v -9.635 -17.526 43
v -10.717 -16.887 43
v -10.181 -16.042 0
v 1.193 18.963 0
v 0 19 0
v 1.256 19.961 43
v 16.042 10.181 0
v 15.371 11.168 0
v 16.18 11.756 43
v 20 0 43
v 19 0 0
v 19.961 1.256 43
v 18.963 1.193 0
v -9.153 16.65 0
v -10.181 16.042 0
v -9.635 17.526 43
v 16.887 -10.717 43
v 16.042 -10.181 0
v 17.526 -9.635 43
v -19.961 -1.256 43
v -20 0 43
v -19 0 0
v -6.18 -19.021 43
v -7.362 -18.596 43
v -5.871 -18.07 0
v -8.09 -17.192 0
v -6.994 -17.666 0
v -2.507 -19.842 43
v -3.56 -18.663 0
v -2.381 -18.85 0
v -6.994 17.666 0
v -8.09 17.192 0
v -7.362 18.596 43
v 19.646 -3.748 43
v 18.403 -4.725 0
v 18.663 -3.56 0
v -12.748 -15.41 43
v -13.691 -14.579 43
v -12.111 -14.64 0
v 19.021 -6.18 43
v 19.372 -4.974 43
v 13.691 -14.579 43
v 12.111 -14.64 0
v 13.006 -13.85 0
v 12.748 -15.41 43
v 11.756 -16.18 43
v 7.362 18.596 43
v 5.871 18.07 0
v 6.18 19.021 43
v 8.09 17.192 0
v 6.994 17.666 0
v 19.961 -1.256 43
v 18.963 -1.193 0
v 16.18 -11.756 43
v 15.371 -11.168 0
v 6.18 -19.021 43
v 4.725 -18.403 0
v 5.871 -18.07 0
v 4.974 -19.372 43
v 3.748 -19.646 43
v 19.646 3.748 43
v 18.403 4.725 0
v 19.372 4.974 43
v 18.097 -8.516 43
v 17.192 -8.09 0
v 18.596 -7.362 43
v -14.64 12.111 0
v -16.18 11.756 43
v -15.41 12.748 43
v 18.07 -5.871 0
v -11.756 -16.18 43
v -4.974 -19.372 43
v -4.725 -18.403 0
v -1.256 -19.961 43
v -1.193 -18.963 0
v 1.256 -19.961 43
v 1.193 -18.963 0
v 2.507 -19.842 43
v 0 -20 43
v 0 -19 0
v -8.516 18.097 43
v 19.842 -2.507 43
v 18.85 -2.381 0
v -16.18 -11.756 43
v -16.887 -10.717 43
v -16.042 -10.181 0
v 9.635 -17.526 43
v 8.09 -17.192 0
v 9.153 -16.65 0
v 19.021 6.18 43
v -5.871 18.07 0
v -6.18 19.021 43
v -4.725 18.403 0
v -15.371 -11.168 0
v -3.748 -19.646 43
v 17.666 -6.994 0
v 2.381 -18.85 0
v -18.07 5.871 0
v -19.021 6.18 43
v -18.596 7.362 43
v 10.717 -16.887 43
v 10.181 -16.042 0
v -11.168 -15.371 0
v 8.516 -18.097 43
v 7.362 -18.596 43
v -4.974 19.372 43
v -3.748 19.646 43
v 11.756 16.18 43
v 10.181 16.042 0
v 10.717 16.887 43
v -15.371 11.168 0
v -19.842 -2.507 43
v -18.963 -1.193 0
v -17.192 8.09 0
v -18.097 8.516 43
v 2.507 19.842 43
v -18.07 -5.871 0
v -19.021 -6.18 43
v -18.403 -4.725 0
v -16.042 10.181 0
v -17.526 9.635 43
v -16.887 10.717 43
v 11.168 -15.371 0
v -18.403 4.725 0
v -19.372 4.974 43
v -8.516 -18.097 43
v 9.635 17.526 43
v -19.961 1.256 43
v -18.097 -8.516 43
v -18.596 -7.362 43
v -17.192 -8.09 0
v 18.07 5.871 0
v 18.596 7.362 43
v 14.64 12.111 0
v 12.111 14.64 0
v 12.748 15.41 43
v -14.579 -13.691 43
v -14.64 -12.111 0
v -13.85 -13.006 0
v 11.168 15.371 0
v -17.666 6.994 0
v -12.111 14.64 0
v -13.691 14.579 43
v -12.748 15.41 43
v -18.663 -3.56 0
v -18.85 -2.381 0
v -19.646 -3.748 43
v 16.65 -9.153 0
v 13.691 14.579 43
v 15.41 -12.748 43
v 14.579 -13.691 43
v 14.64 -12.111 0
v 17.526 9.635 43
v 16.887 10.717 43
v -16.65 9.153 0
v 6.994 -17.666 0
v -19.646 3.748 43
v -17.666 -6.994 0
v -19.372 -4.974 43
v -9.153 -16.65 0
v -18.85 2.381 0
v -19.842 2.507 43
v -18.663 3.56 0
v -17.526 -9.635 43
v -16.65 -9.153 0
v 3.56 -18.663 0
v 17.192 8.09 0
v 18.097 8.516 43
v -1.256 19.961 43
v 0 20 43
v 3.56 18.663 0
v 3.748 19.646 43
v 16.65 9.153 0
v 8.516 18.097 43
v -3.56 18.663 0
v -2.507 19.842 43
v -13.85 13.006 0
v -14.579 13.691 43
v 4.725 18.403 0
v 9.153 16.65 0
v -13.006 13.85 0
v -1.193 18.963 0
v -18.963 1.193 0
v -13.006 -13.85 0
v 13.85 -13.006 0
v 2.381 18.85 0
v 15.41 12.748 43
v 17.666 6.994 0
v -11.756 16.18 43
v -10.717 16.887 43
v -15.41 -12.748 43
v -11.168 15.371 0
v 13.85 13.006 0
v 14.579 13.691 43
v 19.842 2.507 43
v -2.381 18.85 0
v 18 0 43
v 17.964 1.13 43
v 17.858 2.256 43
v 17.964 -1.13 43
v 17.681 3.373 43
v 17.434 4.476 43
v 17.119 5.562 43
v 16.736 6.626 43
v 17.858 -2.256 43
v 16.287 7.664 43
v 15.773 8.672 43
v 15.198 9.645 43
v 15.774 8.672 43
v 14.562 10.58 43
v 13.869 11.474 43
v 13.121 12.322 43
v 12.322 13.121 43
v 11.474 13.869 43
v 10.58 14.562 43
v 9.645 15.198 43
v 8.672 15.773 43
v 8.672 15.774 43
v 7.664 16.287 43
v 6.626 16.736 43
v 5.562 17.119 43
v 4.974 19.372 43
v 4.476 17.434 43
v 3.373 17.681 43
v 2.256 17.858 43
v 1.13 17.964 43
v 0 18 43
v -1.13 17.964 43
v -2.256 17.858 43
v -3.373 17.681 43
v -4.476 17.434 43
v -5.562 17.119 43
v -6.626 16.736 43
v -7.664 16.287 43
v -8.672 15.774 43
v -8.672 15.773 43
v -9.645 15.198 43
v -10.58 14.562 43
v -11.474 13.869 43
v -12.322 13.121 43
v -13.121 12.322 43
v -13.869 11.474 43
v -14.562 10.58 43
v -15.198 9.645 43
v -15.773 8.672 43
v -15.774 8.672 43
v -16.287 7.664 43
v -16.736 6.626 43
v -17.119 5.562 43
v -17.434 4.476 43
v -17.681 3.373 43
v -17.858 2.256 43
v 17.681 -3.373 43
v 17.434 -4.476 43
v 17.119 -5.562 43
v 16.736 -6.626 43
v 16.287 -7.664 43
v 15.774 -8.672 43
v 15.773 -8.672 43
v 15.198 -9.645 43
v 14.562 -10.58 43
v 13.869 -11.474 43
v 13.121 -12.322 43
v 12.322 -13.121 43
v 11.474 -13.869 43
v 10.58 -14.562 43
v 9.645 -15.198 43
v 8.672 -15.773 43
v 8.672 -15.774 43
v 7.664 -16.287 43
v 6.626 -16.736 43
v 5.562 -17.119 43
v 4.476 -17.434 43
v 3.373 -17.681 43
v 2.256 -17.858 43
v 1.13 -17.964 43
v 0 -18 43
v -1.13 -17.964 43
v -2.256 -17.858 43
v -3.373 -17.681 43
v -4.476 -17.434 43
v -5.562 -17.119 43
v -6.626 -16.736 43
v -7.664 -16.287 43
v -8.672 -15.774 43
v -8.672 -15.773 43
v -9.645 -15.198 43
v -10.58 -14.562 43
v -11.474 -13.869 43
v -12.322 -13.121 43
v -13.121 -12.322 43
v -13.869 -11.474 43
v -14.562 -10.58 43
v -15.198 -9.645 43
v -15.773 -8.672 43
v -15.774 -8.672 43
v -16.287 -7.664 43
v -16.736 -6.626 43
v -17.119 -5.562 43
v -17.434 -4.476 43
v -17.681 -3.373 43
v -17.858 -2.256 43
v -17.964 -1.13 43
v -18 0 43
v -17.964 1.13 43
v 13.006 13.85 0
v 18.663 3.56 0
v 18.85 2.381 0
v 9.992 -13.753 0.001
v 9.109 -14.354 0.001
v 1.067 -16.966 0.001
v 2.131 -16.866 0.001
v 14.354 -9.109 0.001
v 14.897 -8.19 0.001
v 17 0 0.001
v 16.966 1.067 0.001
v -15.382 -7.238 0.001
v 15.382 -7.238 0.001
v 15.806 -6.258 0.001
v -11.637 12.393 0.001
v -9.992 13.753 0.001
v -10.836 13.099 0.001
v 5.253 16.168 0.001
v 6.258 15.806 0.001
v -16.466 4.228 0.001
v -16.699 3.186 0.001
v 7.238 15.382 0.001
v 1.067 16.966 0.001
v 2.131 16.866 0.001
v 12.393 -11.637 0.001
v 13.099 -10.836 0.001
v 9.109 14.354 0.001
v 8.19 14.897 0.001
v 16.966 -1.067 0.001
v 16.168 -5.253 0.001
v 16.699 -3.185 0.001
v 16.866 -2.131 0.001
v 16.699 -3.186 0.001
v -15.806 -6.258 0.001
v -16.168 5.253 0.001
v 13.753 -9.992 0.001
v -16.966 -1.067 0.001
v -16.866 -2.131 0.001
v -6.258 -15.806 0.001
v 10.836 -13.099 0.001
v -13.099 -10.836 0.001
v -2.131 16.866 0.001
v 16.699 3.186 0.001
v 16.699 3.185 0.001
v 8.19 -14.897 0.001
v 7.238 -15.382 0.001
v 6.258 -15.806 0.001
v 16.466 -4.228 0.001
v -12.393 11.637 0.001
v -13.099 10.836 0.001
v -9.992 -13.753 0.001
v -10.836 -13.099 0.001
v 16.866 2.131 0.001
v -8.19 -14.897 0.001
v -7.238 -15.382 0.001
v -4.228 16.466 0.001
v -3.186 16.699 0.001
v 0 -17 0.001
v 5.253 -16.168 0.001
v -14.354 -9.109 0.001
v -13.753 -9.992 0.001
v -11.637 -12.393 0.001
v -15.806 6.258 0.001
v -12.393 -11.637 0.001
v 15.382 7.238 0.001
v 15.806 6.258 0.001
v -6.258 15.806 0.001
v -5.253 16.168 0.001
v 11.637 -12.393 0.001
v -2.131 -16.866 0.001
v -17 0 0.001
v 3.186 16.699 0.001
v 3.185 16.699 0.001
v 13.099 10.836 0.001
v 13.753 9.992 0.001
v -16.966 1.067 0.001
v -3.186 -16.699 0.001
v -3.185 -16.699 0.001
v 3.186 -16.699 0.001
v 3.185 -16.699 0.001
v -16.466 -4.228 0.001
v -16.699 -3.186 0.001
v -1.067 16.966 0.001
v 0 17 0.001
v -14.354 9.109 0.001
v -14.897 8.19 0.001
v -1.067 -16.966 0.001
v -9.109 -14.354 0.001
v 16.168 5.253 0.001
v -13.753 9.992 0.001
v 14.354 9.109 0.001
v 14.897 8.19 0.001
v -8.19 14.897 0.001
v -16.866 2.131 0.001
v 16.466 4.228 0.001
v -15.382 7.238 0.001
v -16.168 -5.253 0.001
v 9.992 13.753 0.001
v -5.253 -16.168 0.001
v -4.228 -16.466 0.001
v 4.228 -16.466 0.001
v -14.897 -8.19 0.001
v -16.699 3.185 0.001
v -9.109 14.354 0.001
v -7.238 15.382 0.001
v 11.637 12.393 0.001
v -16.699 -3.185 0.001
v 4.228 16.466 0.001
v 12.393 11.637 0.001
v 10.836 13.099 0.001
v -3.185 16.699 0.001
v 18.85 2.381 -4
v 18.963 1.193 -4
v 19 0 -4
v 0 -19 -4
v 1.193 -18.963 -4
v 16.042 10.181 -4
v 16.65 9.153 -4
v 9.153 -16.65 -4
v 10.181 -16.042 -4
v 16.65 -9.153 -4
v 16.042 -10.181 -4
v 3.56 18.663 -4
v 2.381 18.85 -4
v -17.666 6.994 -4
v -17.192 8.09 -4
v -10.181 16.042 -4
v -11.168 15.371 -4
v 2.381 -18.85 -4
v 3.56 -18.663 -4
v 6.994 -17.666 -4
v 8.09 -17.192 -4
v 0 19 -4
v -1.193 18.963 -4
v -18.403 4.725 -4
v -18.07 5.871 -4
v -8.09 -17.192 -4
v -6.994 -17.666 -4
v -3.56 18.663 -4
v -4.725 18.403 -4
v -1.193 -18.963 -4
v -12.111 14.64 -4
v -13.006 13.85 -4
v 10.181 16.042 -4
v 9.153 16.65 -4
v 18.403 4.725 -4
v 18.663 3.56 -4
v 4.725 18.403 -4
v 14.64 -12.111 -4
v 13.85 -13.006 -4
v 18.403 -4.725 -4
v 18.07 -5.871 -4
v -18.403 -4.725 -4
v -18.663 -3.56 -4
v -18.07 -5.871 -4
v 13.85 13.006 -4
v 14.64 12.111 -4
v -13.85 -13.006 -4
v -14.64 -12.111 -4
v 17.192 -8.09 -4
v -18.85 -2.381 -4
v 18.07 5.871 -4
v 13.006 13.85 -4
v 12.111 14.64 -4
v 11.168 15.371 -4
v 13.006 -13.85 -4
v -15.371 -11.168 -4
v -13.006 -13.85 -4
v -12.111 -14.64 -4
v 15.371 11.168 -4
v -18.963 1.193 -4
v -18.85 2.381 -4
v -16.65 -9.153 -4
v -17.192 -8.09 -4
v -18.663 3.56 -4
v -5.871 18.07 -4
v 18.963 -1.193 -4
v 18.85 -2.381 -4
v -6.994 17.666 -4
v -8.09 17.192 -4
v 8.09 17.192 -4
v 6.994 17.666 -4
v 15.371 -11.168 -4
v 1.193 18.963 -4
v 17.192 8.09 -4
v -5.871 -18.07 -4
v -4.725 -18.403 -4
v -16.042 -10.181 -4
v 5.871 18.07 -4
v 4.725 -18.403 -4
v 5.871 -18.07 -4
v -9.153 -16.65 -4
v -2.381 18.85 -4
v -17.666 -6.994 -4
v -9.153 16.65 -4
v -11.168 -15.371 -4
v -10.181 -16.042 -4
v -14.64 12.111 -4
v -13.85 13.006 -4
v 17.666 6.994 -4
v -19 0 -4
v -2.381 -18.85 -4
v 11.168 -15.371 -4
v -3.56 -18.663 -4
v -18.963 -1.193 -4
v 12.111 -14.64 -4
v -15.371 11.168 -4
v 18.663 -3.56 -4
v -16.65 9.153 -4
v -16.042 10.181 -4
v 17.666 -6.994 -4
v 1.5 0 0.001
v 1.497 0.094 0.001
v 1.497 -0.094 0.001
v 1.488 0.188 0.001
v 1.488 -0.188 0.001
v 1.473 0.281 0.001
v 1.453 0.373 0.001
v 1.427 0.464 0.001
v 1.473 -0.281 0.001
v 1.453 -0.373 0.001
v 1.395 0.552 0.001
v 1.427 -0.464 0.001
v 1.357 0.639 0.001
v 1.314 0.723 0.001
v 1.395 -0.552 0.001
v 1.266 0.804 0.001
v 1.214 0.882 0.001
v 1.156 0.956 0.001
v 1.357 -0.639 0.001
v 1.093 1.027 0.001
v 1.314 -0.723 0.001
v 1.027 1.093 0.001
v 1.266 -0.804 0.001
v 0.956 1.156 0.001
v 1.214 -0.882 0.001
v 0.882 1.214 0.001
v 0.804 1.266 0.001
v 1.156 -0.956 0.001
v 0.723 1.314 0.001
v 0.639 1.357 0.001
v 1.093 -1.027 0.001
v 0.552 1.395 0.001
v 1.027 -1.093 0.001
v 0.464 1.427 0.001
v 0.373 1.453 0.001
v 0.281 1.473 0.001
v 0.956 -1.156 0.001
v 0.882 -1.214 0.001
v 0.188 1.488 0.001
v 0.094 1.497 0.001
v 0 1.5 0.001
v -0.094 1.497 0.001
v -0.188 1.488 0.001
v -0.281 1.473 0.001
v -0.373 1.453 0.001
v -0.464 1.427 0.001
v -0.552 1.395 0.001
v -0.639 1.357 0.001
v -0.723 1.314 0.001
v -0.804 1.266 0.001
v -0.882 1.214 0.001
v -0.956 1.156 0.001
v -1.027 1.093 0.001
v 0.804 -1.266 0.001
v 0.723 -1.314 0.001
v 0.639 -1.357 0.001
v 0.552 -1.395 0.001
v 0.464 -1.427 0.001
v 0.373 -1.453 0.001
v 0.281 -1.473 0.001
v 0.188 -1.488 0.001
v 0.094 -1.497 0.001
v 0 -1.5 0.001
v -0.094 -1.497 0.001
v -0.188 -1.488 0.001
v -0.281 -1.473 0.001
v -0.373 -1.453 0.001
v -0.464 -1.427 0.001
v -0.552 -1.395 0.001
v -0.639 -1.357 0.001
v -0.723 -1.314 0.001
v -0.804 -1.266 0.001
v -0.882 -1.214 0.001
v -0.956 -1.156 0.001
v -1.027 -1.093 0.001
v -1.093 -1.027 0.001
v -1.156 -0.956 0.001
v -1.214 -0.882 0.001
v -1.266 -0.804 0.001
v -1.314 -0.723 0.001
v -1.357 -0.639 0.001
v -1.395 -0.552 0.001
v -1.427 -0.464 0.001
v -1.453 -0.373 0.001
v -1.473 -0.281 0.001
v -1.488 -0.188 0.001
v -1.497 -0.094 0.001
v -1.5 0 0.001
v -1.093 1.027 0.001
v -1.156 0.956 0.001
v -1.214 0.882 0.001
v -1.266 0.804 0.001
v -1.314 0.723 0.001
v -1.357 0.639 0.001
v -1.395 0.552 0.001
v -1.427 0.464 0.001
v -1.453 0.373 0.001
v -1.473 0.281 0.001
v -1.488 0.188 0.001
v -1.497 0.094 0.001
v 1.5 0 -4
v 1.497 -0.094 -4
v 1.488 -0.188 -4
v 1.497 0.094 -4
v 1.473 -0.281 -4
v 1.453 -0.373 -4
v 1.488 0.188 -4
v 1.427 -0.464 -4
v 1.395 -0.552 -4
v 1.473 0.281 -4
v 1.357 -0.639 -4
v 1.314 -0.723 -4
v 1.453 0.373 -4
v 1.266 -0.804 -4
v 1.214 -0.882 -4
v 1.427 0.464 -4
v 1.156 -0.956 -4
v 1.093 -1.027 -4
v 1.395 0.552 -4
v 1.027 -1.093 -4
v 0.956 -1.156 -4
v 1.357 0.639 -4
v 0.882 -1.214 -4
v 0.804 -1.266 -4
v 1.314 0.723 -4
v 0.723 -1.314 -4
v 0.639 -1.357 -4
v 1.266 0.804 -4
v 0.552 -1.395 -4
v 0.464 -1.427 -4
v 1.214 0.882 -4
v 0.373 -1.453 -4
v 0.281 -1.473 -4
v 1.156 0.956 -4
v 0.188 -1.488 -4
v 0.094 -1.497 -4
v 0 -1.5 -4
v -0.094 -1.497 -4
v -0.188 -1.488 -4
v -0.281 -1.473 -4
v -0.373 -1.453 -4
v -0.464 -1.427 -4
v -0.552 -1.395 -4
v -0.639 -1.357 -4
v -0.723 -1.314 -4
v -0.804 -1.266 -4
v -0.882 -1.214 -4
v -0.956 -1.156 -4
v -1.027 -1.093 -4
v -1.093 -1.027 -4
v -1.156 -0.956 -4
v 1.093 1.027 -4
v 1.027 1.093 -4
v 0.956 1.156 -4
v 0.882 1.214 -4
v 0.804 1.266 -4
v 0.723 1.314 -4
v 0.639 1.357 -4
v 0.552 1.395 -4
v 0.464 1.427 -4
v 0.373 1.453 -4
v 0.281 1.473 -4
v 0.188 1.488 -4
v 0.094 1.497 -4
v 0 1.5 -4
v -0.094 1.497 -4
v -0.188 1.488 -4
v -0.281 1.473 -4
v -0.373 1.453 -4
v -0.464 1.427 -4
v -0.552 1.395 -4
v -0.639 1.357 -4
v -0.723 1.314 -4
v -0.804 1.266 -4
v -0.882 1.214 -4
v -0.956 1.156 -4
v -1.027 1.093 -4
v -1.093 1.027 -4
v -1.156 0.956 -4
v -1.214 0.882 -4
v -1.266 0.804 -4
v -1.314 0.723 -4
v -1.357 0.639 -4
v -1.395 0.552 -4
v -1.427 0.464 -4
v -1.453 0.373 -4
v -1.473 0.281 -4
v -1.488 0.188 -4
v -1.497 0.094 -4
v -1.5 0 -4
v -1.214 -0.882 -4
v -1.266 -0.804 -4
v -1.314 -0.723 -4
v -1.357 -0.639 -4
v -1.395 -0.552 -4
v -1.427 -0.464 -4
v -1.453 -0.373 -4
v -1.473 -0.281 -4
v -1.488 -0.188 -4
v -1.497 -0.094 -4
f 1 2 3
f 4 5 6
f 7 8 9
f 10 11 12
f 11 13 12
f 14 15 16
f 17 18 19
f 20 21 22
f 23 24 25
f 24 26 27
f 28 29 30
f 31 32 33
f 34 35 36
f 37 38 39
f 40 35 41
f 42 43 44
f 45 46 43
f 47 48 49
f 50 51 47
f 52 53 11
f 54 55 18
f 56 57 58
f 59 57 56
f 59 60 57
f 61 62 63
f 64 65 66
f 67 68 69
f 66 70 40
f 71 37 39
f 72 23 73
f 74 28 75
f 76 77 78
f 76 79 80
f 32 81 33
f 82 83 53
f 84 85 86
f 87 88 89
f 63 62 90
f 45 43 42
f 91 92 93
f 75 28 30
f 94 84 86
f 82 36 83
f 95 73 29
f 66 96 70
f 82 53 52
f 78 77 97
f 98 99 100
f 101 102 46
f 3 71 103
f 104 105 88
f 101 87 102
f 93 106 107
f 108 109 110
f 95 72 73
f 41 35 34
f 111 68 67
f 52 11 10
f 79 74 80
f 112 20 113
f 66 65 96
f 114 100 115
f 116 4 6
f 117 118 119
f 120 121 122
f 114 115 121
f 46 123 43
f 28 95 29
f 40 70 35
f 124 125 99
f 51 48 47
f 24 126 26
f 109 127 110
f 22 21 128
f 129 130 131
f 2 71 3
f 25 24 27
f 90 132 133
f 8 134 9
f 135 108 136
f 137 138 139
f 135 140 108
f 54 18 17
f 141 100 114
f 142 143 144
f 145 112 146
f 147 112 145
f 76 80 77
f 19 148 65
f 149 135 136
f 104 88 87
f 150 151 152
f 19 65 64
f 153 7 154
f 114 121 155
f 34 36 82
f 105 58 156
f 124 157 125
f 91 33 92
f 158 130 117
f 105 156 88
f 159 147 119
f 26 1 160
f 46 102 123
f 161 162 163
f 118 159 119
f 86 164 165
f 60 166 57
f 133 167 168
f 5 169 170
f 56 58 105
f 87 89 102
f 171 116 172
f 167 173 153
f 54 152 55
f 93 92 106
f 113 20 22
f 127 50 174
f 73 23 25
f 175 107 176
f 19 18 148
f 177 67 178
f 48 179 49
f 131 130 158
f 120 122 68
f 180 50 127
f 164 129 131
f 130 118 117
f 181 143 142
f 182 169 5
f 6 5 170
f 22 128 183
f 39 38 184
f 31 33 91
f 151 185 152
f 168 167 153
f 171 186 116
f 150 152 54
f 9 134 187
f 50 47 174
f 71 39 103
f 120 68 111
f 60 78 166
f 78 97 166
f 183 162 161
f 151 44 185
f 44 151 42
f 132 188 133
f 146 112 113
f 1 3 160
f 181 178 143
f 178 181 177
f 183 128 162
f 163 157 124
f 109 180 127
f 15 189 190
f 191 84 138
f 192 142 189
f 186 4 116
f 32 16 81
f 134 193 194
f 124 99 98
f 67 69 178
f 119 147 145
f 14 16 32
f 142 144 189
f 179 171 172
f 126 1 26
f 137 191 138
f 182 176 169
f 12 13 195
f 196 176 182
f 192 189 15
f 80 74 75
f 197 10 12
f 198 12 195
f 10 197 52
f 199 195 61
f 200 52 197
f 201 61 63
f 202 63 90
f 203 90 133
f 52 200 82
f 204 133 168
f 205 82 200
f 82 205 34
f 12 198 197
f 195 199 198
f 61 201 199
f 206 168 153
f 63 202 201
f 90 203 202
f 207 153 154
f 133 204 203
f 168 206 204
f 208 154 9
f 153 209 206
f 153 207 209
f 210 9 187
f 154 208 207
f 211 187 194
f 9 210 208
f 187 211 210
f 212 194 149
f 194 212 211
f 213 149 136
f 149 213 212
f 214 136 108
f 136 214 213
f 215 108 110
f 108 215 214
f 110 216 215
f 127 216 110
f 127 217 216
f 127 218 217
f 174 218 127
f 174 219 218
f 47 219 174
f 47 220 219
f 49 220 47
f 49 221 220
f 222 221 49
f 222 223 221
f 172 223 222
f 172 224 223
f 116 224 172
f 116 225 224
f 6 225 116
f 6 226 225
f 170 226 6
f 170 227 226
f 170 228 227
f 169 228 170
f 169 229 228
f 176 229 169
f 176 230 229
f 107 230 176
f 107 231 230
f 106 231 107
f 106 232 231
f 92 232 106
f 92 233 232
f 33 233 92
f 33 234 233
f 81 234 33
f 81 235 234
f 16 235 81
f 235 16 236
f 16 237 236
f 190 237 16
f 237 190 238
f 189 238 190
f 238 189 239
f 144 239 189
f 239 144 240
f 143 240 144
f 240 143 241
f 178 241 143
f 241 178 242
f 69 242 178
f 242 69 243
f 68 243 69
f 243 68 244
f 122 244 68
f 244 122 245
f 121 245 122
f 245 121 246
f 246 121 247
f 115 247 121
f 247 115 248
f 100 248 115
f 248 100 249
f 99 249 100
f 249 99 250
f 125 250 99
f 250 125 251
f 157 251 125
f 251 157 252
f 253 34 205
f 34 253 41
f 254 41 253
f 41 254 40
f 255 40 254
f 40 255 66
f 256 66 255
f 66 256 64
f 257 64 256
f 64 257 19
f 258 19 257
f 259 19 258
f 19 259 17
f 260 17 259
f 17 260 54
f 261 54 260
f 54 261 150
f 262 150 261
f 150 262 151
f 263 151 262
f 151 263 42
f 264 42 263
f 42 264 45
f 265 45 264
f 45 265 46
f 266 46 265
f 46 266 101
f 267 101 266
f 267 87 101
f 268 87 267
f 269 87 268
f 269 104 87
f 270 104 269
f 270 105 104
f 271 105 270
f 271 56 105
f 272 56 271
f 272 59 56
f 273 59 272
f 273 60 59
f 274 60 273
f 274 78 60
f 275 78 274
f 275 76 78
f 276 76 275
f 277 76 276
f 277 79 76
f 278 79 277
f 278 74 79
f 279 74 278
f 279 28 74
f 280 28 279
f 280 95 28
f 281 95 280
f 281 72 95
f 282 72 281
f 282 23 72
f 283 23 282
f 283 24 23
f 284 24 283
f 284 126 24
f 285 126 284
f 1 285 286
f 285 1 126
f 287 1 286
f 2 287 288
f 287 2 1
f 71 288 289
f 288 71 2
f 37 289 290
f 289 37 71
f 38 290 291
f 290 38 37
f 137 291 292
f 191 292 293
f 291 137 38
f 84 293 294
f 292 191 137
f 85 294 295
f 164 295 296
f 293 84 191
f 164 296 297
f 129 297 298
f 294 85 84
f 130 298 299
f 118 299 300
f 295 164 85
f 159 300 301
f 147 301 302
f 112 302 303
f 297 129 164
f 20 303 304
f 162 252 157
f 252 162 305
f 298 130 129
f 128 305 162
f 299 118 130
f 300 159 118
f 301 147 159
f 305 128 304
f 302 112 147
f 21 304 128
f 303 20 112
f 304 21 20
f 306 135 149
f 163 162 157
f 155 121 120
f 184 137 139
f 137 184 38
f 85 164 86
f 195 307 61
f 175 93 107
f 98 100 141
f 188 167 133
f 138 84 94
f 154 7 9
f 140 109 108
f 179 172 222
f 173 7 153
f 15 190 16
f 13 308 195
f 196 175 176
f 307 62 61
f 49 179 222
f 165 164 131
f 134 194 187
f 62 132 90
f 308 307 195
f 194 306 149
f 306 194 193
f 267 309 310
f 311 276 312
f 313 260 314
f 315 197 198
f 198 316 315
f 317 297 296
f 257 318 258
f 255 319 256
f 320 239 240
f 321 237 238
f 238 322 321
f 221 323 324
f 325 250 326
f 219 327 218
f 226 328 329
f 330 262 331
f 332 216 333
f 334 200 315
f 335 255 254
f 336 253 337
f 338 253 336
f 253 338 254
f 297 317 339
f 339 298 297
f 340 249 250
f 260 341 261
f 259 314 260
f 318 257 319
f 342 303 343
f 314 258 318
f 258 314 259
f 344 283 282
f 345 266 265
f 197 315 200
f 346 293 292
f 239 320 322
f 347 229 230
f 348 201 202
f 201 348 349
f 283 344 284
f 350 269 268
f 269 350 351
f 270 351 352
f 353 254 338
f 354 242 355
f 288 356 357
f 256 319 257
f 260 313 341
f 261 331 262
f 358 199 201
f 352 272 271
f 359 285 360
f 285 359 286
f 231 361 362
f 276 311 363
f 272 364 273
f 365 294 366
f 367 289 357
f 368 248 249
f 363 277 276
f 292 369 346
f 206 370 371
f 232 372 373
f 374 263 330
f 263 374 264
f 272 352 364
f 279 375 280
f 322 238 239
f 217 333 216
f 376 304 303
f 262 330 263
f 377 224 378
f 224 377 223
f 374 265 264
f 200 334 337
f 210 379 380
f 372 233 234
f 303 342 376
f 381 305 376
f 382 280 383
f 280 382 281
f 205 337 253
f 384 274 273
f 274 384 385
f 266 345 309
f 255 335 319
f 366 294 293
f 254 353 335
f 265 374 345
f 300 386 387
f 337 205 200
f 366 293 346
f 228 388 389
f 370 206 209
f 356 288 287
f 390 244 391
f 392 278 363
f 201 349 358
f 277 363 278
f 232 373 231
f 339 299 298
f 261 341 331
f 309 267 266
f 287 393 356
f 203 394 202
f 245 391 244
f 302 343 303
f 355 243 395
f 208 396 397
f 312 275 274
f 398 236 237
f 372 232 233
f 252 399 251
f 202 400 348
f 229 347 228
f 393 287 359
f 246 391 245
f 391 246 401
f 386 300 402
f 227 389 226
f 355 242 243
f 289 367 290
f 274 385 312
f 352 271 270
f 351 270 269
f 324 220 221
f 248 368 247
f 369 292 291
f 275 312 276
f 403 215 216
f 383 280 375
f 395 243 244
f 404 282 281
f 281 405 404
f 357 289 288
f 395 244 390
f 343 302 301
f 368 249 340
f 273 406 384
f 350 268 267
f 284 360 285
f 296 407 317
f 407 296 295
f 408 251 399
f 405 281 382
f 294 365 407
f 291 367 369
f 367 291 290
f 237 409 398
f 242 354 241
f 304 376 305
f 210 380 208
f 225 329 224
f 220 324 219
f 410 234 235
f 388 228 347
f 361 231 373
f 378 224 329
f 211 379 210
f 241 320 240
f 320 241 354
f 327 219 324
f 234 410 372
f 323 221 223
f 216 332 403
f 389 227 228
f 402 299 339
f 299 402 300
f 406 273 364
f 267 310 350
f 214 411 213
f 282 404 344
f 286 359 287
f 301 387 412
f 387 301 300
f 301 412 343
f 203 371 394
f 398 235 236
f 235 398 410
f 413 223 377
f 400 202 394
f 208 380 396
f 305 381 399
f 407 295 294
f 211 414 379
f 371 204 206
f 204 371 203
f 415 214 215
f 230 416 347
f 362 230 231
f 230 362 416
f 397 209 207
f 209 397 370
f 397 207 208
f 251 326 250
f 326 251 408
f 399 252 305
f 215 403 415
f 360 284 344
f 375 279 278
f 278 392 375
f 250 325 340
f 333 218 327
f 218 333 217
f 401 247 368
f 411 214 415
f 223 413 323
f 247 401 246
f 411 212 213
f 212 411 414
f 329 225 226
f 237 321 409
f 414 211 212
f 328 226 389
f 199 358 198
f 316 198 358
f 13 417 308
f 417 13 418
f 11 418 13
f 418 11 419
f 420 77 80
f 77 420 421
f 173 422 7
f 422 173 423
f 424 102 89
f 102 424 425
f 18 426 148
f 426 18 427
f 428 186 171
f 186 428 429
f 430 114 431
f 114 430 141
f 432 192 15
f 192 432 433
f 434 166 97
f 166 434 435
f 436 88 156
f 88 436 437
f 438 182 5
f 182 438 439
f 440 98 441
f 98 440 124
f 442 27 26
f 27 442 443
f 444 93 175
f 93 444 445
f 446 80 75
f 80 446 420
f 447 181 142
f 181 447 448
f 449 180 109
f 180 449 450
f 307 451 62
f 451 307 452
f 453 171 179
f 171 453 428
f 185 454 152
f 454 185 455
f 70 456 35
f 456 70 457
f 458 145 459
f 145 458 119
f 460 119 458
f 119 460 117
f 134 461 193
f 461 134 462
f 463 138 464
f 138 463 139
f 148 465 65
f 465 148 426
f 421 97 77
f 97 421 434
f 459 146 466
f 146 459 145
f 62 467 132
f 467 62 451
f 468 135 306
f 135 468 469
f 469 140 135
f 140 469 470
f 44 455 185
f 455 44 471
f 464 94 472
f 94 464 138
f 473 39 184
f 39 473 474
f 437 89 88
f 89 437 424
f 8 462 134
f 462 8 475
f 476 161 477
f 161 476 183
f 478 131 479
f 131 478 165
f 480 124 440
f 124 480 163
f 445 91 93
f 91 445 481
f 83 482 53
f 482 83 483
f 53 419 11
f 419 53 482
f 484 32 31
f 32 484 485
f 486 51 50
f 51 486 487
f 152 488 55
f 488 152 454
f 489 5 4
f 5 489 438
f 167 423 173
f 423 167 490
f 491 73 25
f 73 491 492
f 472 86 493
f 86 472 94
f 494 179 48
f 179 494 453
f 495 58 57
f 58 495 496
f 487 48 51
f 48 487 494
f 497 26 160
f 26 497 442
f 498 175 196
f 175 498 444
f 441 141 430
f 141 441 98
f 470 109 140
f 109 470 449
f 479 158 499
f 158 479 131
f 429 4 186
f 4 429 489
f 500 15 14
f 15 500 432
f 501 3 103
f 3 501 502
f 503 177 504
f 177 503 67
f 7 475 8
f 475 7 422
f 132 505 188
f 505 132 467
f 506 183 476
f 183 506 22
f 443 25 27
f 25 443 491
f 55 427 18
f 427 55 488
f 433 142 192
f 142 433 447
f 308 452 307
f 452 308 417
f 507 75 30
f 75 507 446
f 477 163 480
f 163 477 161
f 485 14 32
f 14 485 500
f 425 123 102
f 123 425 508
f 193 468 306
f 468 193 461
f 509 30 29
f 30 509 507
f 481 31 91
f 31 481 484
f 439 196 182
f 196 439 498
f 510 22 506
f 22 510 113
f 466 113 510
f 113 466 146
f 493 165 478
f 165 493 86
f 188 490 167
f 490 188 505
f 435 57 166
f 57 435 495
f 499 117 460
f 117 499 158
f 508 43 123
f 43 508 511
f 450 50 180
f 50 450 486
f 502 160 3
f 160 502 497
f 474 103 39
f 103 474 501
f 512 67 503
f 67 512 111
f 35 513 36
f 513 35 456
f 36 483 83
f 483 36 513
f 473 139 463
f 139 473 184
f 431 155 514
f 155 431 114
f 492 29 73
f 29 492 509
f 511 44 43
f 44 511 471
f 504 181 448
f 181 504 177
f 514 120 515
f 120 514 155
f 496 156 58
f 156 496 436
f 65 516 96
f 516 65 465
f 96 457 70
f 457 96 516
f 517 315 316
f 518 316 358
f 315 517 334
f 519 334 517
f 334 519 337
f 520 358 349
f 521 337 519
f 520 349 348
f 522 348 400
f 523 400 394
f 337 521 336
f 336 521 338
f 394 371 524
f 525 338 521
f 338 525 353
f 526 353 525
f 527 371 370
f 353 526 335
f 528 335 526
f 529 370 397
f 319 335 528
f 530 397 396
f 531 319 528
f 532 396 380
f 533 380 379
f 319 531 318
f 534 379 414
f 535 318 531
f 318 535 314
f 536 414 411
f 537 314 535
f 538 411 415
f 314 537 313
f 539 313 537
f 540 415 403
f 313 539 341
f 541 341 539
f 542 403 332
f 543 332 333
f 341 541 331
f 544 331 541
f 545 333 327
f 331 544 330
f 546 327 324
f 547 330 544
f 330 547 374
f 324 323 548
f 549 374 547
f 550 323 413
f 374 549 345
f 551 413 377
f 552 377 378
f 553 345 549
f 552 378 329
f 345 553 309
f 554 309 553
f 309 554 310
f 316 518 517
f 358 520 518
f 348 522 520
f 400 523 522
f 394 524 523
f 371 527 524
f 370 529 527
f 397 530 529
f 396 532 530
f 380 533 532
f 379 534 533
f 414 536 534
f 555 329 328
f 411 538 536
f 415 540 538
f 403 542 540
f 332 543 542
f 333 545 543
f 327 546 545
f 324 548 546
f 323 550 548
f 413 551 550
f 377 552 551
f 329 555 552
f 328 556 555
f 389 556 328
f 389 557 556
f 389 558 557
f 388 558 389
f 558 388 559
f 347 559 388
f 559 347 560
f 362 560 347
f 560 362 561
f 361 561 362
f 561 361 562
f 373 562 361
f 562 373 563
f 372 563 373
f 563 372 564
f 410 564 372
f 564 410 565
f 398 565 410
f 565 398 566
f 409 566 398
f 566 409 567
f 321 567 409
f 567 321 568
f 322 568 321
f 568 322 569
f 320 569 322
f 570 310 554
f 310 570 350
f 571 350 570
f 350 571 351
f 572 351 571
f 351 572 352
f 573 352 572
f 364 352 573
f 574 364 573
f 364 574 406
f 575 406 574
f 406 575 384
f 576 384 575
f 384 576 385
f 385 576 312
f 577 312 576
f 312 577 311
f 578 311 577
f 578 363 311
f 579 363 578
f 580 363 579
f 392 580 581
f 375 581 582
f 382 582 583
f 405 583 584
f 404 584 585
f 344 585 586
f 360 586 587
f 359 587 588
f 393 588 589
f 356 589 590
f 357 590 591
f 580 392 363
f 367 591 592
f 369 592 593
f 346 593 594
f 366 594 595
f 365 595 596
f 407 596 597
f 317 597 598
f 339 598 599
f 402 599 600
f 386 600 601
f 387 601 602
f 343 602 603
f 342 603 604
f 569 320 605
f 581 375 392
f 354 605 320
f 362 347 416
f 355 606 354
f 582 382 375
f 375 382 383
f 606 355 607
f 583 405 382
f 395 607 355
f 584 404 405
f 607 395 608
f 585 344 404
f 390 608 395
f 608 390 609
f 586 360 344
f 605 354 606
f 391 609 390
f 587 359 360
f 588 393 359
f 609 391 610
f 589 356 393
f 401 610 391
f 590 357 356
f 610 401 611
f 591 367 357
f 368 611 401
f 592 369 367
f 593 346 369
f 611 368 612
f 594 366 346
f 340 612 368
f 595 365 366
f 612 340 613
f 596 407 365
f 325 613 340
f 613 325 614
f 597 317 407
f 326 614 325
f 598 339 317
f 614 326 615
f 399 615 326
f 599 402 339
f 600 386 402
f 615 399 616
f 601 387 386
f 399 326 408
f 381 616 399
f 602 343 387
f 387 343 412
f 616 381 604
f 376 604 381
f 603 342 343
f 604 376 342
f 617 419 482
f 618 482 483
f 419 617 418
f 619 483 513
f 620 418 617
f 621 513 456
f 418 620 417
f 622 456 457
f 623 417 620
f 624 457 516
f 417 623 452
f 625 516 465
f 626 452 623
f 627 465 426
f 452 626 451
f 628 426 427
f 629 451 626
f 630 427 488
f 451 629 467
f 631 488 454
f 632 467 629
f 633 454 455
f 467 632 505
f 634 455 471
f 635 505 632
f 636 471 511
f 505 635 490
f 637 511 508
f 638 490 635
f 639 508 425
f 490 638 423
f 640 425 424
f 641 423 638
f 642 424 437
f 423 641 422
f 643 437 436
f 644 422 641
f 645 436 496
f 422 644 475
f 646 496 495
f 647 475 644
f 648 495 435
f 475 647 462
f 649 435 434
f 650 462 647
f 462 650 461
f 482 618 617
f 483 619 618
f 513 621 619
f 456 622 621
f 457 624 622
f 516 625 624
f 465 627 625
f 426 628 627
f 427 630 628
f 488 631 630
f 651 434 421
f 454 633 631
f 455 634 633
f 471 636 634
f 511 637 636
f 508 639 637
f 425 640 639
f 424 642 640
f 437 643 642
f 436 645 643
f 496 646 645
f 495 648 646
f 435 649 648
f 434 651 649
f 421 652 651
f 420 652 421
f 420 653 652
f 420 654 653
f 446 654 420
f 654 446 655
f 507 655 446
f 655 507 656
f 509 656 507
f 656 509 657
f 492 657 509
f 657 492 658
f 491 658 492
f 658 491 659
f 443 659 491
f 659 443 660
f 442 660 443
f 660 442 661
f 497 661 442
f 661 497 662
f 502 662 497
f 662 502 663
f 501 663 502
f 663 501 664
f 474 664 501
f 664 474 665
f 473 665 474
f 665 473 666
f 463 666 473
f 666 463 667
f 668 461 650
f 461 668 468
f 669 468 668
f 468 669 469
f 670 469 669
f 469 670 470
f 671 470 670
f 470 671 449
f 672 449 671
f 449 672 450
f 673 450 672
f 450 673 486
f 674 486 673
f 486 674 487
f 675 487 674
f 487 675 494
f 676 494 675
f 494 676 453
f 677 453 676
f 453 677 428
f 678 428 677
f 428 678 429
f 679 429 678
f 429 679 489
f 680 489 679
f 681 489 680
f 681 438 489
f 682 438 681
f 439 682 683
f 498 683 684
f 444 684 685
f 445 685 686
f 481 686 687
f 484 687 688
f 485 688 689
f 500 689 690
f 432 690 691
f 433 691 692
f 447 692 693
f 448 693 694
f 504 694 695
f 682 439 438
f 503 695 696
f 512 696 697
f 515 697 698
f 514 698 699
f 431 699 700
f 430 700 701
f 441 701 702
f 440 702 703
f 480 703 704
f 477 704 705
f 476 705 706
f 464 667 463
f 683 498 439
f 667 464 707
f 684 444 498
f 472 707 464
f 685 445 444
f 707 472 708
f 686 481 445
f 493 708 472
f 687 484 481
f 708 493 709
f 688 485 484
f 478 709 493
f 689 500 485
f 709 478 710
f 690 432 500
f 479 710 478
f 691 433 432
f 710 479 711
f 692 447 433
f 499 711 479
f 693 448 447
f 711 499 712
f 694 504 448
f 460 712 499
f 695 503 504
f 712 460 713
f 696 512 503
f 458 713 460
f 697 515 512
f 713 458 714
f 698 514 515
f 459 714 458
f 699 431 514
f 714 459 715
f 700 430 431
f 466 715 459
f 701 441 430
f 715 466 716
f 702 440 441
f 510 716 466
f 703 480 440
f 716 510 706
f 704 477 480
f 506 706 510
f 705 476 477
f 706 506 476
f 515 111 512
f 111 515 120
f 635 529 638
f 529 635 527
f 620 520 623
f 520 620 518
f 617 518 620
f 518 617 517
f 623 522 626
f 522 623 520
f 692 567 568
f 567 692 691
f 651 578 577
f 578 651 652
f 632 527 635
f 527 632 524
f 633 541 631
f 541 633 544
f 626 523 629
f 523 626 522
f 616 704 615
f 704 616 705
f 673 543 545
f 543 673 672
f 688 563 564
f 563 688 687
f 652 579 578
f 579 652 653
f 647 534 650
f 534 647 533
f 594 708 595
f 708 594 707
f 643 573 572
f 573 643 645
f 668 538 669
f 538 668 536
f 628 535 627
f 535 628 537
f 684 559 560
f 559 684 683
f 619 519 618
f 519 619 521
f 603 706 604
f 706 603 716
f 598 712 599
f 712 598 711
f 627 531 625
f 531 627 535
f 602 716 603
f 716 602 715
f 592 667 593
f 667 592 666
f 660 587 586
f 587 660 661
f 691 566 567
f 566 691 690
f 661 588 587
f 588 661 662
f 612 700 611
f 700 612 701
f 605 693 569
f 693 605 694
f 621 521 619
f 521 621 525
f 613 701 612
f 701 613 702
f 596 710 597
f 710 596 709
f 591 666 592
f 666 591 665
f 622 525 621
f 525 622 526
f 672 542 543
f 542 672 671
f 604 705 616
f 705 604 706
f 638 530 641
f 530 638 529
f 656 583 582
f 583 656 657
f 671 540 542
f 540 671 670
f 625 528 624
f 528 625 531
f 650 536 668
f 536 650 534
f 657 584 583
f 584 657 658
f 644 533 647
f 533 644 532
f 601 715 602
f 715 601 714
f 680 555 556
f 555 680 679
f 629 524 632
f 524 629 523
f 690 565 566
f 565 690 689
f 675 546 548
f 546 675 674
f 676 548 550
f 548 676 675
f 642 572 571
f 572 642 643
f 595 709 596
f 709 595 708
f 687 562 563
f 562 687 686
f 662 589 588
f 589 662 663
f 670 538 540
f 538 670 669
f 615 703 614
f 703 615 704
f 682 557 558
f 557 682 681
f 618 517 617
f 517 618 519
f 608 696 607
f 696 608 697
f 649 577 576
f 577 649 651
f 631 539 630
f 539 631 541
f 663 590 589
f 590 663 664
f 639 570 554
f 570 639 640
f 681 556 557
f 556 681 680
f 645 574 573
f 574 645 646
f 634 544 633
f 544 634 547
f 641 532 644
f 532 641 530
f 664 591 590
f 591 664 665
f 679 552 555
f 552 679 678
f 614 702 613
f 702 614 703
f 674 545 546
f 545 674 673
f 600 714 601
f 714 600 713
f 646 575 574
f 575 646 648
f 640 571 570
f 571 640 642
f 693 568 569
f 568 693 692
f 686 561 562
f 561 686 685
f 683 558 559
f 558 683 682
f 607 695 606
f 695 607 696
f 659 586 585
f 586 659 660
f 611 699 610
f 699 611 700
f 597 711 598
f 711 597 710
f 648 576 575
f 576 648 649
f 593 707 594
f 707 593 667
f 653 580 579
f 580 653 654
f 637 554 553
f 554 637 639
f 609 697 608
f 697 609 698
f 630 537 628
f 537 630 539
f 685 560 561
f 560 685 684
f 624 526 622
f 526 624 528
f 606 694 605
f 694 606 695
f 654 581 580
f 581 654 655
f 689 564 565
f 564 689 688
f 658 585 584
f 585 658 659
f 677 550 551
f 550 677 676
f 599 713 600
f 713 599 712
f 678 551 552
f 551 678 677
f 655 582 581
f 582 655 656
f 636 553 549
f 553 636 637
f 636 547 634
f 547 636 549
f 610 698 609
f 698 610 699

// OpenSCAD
// file: defs.scad
N_conexao = 36;
theta_h = 360 / N_conexao;
theta_v = 130;
d_conexao = 38;
d_inner_conexao = 20;
h_cunha = ( tan( theta_h / 2 ) * d_conexao ) / ( 2 * tan( theta_v / 2 ) );
bottom_conexao = 1;
eixo_conexao = 6;
tol_conexao = 0.25;

d_top_pescoco = 33;
d_bottom_pescoco = 35;
d_hole = 3;

wall_pescoco = 4;
bottom_wall_pescoco = 4;

height_pescoco = 43;

tol_pescoco = 1;

angulo_pescm = 0;
thick_pescm = 8;
h_pescm = 30;
thick_base_pescm = 4;
del_pescm = 5;

r_hole = ( d_inner_conexao + ( d_conexao - d_inner_conexao ) / 2 ) / 2;

p_barril = 510;
d_barril = p_barril / 3.14;
lip_barril = 12;
wall_conn_pescs = 12 * 2;
length_conn_pescs = 110;
N_par_barril = 4;
del_par_barril = 5;
d_par_barril = 3;
thick_pescs = 10;
dist_pescs = 3;
width_pescs = 25;
tol_pescs = 0.4;

d_plug = 12;
pos_plug = 0.5;
plug_brack_h = 2.5;
plug_brack_w = 4.5;
angle_plug = 360 * ( d_plug + plug_brack_h ) / ( 3.14 * ( d_barril + wall_conn_pescs / 2 ) );
// main file
include <defs.scad>

module pescoco(){

    difference(){
        
        cylinder(
            d1 = d_top_pescoco + wall_pescoco + tol_pescoco,
            d2 = d_bottom_pescoco + wall_pescoco + tol_pescoco,
            h = height_pescoco,
            $fn = 100
        );
        
        translate( [ 0, 0, -1e-3 ] )
            cylinder(
                d1 = d_top_pescoco + tol_pescoco,
                d2 = d_bottom_pescoco + tol_pescoco,
                h = height_pescoco + 2e-3,
                $fn = 100
            );
        
    }
    difference(){
        translate( [ 0, 0, -wall_pescoco ] )
            cylinder(
                d = d_top_pescoco + wall_pescoco + tol_pescoco,
                h = wall_pescoco + 1e-3,
                $fn = 100
            );
        translate( [ 0, 0, -wall_pescoco - 1 ] )
            cylinder(
                d = d_hole,
                h = wall_pescoco + 100,
                $fn = 100
            );
    }
}

pescoco();
